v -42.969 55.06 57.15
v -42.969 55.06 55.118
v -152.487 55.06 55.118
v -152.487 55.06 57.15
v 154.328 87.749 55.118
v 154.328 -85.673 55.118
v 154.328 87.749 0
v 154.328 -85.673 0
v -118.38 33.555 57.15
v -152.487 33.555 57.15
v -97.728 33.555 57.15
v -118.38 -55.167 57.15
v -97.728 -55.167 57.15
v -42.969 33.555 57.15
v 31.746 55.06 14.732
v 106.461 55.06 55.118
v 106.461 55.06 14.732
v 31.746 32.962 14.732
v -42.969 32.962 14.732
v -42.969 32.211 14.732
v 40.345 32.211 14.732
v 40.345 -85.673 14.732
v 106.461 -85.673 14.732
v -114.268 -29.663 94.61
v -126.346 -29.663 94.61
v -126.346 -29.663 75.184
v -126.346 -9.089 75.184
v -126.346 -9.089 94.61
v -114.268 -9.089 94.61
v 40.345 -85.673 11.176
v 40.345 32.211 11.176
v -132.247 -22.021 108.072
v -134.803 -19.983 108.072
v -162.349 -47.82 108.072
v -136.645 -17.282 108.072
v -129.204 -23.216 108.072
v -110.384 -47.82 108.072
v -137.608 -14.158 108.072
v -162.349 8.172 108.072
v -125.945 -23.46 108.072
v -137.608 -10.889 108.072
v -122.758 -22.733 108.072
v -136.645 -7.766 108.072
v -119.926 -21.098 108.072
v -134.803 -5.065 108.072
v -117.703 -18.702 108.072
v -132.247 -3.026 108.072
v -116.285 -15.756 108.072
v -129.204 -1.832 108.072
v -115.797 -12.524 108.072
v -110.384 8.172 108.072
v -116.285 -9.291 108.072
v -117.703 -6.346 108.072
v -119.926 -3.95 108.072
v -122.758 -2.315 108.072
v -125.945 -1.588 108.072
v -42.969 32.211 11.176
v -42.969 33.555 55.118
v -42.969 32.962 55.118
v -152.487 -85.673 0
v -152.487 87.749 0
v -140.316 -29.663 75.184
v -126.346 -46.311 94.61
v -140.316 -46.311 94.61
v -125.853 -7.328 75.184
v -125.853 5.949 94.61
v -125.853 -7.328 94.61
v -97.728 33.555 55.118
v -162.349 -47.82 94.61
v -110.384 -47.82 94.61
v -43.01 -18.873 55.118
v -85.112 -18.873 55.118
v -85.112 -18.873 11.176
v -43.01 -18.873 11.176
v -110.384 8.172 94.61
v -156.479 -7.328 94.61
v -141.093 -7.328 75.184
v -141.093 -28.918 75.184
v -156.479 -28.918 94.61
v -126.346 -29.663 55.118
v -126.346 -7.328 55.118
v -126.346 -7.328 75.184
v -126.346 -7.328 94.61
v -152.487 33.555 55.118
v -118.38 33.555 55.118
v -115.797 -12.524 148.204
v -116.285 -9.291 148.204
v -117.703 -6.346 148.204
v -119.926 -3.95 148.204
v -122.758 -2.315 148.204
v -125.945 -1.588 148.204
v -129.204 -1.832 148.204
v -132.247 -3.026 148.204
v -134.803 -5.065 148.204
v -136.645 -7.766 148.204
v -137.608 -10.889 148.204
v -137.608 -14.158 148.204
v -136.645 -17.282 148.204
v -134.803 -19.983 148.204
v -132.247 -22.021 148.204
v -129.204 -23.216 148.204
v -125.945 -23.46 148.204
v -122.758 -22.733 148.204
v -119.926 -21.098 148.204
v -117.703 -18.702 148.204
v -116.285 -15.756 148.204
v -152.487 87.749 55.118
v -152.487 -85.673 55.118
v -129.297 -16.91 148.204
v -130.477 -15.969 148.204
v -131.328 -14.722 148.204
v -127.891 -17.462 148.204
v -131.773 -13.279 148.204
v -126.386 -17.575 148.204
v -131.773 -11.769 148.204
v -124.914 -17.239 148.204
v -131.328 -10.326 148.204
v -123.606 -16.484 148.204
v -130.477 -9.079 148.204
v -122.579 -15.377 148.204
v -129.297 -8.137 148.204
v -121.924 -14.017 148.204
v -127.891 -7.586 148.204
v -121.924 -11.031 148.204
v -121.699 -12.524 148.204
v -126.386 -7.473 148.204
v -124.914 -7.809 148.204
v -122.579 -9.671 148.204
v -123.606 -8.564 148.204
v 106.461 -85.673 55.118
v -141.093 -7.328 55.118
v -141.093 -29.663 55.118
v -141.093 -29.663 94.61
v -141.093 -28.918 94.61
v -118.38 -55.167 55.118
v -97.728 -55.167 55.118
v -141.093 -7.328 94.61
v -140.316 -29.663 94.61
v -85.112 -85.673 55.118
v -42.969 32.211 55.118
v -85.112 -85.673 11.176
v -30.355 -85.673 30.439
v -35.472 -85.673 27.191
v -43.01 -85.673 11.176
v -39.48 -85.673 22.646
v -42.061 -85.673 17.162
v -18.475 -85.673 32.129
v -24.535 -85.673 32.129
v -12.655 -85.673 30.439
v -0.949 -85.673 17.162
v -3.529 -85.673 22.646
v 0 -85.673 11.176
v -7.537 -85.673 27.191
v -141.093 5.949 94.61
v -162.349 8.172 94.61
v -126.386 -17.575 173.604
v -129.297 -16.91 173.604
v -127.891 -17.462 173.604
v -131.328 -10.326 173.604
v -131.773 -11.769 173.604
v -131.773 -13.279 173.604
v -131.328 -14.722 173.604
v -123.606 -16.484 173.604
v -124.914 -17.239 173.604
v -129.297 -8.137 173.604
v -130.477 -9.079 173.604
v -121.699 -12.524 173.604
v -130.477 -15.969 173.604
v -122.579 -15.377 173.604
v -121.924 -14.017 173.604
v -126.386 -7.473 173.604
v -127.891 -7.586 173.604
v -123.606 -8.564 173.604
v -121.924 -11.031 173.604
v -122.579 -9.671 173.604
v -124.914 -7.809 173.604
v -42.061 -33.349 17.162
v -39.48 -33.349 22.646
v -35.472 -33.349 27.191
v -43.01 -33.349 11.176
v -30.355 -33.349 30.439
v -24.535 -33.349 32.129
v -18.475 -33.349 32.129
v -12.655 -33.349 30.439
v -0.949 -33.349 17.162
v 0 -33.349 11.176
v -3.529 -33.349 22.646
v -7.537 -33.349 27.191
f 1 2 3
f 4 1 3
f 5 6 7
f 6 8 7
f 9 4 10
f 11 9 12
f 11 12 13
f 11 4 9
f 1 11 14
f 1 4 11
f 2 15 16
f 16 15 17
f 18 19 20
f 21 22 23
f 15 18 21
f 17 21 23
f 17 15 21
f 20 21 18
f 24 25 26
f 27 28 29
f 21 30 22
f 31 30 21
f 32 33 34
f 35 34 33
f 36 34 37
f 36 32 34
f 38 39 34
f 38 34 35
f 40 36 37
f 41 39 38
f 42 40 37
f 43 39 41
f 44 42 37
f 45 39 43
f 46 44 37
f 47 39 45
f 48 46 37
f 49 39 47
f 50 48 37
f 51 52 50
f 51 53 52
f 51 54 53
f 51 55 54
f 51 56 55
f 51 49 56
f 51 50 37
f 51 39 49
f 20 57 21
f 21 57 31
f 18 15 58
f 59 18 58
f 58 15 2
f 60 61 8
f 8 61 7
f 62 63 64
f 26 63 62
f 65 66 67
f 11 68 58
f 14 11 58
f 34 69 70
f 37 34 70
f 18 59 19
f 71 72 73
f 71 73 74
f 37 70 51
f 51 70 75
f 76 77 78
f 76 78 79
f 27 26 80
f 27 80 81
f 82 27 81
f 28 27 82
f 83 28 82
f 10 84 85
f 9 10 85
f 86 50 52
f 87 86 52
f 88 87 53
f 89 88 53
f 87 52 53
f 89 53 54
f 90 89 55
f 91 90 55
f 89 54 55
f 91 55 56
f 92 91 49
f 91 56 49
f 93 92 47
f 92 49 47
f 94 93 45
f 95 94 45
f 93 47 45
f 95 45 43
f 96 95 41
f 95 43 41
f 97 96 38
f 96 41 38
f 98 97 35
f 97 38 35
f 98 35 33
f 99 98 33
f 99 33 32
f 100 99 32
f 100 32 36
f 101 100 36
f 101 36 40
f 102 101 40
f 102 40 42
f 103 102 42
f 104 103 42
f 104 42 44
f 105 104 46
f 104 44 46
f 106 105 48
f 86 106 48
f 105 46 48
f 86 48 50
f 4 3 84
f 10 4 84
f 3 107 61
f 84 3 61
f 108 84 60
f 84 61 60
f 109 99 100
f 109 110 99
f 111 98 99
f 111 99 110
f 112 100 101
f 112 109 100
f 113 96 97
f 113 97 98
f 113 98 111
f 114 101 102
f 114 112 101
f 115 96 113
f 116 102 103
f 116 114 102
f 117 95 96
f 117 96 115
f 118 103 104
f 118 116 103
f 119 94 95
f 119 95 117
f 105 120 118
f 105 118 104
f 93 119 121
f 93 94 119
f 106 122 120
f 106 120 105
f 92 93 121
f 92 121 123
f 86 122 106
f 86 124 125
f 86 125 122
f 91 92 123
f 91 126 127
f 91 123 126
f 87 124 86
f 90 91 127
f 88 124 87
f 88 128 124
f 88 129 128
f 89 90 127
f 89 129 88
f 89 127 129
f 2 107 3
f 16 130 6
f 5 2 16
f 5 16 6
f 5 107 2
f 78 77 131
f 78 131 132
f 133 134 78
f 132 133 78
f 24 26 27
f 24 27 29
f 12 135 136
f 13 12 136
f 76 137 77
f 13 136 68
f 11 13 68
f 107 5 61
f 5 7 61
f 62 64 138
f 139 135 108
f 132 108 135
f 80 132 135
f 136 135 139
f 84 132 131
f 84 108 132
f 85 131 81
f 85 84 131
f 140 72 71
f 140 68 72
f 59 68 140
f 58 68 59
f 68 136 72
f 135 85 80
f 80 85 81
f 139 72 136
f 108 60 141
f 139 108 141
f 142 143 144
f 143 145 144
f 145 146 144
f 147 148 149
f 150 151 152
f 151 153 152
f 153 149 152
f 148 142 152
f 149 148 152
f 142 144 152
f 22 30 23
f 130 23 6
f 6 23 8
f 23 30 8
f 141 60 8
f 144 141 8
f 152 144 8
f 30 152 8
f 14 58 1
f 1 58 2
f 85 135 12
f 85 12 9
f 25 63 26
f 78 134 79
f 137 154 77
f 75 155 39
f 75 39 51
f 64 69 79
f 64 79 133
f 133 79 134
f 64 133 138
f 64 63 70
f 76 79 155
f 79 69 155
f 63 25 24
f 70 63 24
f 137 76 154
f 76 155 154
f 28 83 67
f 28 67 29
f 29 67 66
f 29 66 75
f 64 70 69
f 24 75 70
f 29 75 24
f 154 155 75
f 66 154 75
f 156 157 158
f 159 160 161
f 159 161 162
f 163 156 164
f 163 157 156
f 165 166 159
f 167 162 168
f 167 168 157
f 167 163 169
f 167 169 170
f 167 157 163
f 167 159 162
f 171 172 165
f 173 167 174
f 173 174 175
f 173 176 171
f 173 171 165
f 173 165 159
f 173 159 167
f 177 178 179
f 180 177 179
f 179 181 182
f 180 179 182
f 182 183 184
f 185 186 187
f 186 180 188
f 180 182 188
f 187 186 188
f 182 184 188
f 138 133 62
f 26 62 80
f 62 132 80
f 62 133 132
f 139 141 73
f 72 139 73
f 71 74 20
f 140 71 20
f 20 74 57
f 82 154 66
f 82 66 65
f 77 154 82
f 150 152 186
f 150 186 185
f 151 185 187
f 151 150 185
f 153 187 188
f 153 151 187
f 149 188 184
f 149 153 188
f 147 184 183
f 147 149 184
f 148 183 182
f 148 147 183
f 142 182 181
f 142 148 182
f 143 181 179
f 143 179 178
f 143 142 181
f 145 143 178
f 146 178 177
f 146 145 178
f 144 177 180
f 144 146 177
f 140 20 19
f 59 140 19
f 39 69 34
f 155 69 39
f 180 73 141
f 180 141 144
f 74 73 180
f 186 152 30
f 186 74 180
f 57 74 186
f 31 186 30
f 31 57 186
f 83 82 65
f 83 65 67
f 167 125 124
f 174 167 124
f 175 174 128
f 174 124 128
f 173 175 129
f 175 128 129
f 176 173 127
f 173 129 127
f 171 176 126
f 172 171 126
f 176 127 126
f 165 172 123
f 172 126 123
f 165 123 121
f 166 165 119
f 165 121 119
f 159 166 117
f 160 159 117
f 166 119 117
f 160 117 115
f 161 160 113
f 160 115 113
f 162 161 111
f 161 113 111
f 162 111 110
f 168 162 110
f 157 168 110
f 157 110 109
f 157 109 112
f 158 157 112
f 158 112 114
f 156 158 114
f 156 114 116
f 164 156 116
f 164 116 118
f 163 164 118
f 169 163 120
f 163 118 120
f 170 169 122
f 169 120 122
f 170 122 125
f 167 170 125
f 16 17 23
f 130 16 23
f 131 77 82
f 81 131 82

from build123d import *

# Parameters (mm, degrees)
F0_W      = 306.8140745163
F0_H      = 173.4216436744
F1_DEPTH  = 11.176
F3_DEPTH  = 52.324
F4_W      = 66.1161988974
F4_H      = 117.8840361536
F5_DEPTH  = 3.556
F7_DEPTH  = 43.942
F9_DEPTH  = 22.098
F10_W     = 20.6523872912
F10_H     = 88.7217707932
F11_DEPTH = 2.032
F12_W     = 14.7464126348
F12_H     = 22.3355772905
F13_DEPTH = 40.132
F15_DEPTH = 13.97
F17_DEPTH = 20.574
F19_DEPTH = 15.24
F21_DEPTH = 21.59
F22_W     = 51.9647672772
F22_H     = 55.9918135405
F23_DEPTH = 13.462
F24_R     = 10.9667117053
F25_DEPTH = 40.132
F26_R     = 5.0651062628
F27_DEPTH = 25.4


with BuildPart() as f1:
    # F0 (on Top) → F1 (new body)
    with BuildSketch(Plane.XY):
        with Locations((0.9204745293, 1.0380260646)):
            Rectangle(F0_W, F0_H)
    extrude(amount=F1_DEPTH)

    # F2 (on face) → F3 (join)
    with BuildSketch(Plane.XZ.offset(85.6727957726)):
        with BuildLine():
            ThreePointArc((0, 11.176), (-21.5048603714, 32.3440063265), (-43.0097207427, 11.176))
            Line((-43.0097207427, 11.176), (0, 11.176))
        make_face()
    extrude(amount=-F3_DEPTH)

    # F4 (on face) → F5 (join)
    with BuildSketch(Plane.XY.offset(11.176)):
        with Locations((73.4031423926, -26.7307776958)):
            Rectangle(F4_W, F4_H)
        Polygon((-42.968980968, 32.211240381), (40.345042944, 32.211240381), (106.4612418413, 32.211240381), (106.4612418413, 55.06047979), (-42.968980968, 55.06047979), align=None)
    extrude(amount=F5_DEPTH)

    # F6 (on face) → F7 (join)
    with BuildSketch(Plane.XY.offset(11.176)):
        Polygon((106.4612418413, 55.06047979), (106.4612418413, -85.6727957726), (154.3275117874, -85.6727957726), (154.3275117874, 87.7488479018), (-152.4865627289, 87.7488479018), (-152.4865627289, -85.6727957726), (-85.112079978, -85.6727957726), (-85.112079978, -18.8729763031), (-43.0097207427, -18.8729763031), (-42.968980968, 32.211240381), (-42.968980968, 55.06047979), align=None)
    extrude(amount=F7_DEPTH)

    # F8 (on face) → F9 (join)
    with BuildSketch(Plane.XZ.offset(-55.06047979)):
        Polygon((-42.968980968, 14.732), (31.7461304367, 14.732), (-42.968980968, 55.118), align=None)
    extrude(amount=F9_DEPTH)

    # F10 (on face) → F11 (join)
    with BuildSketch(Plane.XY.offset(55.118)):
        Polygon((-42.968980968, 33.5549861193), (-42.968980968, 55.06047979), (-152.4865627289, 55.06047979), (-152.4865627289, 33.5549861193), (-118.3801591396, 33.5549861193), (-97.7277718484, 33.5549861193), align=None)
        with Locations((-108.053965494, -10.8058992773)):
            Rectangle(F10_W, F10_H)
    extrude(amount=F11_DEPTH)

    # F12 (on face) → F13 (join)
    with BuildSketch(Plane.XY.offset(55.118)):
        with Locations((-133.7195262313, -18.4955450241)):
            Rectangle(F12_W, F12_H)
    extrude(amount=F13_DEPTH)

    # F14 (on face) → F15 (join)
    with BuildSketch(Plane.YZ.offset(-126.3463199139)):
        Polygon((-46.4369356632, 94.7568938136), (-29.6633336693, 75.184), (-29.6633336693, 95.25), align=None)
    extrude(amount=-F15_DEPTH)

    # F16 (on face) → F17 (join)
    with BuildSketch(Plane.XZ.offset(29.6633336693)):
        Polygon((-126.3463199139, 96.3086783886), (-126.3463199139, 75.184), (-113.2118999958, 96.3086783886), align=None)
    extrude(amount=-F17_DEPTH)

    # F18 (on face) → F19 (join)
    with BuildSketch(Plane(origin=(-141.0927325487, 0, 0), x_dir=(0, -1, 0), z_dir=(-1, 0, 0))):
        Polygon((7.3277563788, 75.184), (7.3277563788, 95.25), (-6.3867359422, 95.25), align=None)
    extrude(amount=-F19_DEPTH)

    # F20 (on face) → F21 (join)
    with BuildSketch(Plane(origin=(0, -7.3277563788, 0), x_dir=(-1, 0, 0), z_dir=(0, 1, 0))):
        Polygon((141.0927325487, 94.6096107364), (141.0927325487, 75.184), (156.4792990685, 94.6096107364), align=None)
    extrude(amount=-F21_DEPTH)

    # F22 (on face) → F23 (join)
    with BuildSketch(Plane.XY.offset(94.6096107364)):
        with Locations((-136.3664530218, -19.8239125311)):
            Rectangle(F22_W, F22_H)
    extrude(amount=F23_DEPTH)

    # F24 (on face) → F25 (join)
    with BuildSketch(Plane.XY.offset(108.0716107364)):
        with Locations((-126.7641037703, -12.5239156187)):
            Circle(F24_R)
    extrude(amount=F25_DEPTH)

    # F26 (on face) → F27 (join)
    with BuildSketch(Plane.XY.offset(148.2036107364)):
        with Locations((-126.7641037703, -12.5239156187)):
            Circle(F26_R)
    extrude(amount=F27_DEPTH)


solid = f1.part
